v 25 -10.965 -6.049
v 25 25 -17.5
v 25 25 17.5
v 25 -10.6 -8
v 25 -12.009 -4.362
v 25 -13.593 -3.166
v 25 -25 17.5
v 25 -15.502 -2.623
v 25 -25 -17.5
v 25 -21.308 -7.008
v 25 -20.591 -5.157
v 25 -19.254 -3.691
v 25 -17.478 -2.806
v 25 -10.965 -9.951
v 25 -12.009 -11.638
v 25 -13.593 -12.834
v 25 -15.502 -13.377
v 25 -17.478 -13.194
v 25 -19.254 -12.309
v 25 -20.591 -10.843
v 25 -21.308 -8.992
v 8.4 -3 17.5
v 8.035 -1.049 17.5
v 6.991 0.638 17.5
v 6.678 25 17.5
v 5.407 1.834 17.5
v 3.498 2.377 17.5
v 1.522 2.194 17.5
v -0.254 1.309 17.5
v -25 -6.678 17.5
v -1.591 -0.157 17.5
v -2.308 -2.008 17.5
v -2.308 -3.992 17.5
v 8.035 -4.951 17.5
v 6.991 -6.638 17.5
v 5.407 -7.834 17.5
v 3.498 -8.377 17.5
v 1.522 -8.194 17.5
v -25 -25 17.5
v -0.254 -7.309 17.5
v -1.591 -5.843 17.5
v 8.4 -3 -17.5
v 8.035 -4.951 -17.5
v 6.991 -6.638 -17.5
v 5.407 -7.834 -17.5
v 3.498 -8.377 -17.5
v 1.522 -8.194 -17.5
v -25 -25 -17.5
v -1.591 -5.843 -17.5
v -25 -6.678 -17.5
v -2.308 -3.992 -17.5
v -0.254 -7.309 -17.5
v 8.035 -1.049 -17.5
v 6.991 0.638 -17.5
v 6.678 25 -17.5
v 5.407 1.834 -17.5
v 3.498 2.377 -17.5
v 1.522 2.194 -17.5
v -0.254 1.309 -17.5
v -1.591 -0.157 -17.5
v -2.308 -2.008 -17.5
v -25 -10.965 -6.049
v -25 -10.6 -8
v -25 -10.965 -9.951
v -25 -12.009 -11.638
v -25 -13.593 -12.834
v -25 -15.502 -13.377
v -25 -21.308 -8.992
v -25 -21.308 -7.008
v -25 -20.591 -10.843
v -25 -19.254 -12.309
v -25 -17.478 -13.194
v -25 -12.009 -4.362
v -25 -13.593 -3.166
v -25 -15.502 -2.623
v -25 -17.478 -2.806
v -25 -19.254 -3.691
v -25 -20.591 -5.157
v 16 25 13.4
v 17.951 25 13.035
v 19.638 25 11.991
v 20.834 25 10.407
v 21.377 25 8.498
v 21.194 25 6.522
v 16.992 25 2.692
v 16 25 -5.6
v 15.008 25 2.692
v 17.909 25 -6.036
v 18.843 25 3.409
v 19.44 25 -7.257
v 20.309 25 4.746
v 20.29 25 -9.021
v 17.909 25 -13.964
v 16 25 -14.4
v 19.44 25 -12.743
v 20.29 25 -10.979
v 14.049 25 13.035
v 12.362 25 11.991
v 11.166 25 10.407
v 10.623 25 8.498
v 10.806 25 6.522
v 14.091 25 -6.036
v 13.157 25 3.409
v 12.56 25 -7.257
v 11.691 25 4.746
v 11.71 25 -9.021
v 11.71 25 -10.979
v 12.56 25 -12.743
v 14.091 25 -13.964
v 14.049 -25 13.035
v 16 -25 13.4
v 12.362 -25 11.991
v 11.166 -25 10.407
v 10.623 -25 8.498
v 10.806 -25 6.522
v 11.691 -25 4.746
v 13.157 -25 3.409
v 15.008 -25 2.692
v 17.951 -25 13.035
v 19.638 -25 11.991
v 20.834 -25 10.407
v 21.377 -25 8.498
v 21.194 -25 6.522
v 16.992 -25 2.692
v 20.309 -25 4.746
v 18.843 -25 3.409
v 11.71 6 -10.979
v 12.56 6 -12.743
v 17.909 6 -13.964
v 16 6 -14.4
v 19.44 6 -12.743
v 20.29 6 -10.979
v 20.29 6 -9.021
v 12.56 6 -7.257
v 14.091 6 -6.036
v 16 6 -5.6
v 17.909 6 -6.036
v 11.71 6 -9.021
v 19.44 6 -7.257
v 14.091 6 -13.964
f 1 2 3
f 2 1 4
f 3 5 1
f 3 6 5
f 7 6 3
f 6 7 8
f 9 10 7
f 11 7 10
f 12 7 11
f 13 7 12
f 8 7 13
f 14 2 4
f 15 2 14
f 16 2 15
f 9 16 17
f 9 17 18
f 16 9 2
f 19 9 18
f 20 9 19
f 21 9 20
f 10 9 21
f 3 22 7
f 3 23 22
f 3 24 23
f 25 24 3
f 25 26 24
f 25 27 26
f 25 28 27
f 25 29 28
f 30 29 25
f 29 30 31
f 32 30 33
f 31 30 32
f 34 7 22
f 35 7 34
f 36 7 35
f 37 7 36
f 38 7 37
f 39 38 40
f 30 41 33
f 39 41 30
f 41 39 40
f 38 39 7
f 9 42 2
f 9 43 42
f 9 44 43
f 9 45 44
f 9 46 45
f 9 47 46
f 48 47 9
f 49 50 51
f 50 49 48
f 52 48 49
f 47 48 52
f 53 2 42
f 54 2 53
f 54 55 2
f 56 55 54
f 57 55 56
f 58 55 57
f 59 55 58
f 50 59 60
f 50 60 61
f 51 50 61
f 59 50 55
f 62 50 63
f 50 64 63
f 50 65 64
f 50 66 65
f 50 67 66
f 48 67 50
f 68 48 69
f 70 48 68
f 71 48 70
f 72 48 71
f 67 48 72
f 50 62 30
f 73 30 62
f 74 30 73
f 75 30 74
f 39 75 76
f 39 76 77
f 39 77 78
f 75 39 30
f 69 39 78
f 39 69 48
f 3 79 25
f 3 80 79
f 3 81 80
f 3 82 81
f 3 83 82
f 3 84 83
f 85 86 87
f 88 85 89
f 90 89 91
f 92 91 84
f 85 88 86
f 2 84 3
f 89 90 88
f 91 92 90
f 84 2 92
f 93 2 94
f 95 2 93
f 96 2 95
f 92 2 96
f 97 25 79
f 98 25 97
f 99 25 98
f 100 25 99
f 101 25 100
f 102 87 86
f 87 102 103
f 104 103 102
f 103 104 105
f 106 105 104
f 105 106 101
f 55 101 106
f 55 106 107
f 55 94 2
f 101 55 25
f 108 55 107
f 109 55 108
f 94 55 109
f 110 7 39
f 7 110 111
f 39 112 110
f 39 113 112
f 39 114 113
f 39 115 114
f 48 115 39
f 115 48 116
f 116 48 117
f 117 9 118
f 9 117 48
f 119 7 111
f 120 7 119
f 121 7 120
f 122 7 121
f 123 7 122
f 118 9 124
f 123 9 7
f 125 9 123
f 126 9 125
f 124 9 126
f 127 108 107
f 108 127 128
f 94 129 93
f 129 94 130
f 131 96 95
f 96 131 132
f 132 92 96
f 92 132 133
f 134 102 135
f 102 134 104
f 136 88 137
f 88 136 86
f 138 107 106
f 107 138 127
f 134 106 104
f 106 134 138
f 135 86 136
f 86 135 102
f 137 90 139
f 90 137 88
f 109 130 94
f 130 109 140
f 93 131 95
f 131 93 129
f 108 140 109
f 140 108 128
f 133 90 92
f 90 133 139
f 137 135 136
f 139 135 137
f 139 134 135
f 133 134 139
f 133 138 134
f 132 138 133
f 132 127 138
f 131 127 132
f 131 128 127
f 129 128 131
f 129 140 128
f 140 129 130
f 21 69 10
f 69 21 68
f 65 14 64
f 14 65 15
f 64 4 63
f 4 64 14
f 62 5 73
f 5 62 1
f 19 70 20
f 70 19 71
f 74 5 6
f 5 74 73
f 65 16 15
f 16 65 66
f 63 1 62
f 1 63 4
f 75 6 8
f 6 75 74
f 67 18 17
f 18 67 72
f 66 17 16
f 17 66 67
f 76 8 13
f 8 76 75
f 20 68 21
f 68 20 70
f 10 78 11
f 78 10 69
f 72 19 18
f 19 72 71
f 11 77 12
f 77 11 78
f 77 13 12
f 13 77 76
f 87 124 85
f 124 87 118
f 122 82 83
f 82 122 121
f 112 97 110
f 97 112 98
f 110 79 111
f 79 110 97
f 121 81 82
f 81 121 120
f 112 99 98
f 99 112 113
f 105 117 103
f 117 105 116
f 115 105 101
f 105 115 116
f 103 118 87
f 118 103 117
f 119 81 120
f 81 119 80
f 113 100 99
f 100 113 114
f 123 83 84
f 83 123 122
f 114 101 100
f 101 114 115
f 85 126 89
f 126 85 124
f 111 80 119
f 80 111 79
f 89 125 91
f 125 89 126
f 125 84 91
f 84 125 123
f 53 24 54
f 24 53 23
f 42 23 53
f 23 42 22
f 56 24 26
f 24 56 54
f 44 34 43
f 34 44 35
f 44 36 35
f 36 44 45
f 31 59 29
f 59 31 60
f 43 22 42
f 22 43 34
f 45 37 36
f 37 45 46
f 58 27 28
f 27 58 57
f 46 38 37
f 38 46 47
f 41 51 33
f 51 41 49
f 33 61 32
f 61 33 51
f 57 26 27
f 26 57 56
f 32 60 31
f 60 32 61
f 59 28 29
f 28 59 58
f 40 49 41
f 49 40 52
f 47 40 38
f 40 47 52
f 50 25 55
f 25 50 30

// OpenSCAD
module base()
{

difference(){
//main box
translate(v=[0,0,0]) cube(size = [50,50,35], center = true);


//8mm rod
translate(v=[16,16,-10]) rotate(a=[90,90,0]) rotate(a=[0,0,0]) cylinder(h=20, r=4.4, center = true);

//3/8 all thread hole
translate(v=[-12,-16,-8]) rotate(a=[0,-90,0]) rotate(a=[0,0,90]) cylinder(h=80, r=5.4, center = true);

//3/8 all thread hole
translate(v=[16,0,8]) rotate(a=[0,-90,0]) rotate(a=[90,0,0]) cylinder(h=80, r=5.4, center = true);


// vertical 3/8 all thread hole
translate(v=[3,-3,0]) rotate(a=[0,0,0]) rotate(a=[0,0,0]) cylinder(h=80, r=5.4, center = true);
//cutout of all thread holes
//translate(v=[16,-16,0]) cube(size = [32,32,41], center = true);

translate(v=[-18,18,0]) rotate(a=[0,0,45]) cube(size = [45,25,41], center = true);
}

}


module finished()
{

base();	

}

finished();
